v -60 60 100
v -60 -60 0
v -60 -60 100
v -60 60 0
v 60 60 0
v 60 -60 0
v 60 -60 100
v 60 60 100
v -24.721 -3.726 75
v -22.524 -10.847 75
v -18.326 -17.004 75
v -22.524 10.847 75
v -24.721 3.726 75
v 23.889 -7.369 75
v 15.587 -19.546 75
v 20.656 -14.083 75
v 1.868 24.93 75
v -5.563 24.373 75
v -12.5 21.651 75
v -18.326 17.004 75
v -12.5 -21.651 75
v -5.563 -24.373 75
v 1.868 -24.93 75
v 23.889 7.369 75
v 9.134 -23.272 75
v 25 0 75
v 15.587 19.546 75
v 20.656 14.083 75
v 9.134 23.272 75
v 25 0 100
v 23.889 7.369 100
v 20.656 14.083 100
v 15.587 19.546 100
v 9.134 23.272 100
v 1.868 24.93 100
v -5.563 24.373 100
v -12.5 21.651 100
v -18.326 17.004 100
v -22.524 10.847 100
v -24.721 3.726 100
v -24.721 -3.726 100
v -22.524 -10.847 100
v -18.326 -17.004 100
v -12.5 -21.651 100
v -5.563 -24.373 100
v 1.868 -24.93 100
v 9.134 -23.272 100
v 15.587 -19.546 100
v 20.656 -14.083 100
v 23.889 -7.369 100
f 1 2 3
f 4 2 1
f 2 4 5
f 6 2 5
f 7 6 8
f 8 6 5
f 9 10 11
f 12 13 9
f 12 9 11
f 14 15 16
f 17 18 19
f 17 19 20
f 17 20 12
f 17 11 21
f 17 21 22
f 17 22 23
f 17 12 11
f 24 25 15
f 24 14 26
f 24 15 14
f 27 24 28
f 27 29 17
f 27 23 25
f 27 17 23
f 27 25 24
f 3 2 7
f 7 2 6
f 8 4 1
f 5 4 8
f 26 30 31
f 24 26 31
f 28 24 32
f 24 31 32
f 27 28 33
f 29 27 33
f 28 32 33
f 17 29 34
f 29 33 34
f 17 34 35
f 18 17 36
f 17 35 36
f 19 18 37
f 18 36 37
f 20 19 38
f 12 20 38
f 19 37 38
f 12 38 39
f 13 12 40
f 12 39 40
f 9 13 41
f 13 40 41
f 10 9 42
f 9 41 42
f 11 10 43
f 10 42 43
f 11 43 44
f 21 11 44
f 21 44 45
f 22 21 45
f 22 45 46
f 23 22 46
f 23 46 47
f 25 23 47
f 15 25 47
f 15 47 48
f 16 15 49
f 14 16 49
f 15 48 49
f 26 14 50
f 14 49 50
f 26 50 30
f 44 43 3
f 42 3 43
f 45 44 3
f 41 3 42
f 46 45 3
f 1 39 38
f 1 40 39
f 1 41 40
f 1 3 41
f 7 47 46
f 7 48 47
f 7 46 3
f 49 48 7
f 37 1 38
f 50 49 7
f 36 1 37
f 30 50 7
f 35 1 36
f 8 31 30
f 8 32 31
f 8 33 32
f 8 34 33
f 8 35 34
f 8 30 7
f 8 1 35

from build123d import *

# Parameters (mm, degrees)
F0_W     = 120
F0_H     = 120
F1_DEPTH = 100
F2_R     = 25
F3_DEPTH = 25


with BuildPart() as f1:
    # F0 (on Top) → F1 (new body)
    with BuildSketch(Plane.XY):
        Rectangle(F0_W, F0_H)
    extrude(amount=F1_DEPTH)


with BuildPart() as f3:
    # F2 (on face) → F3 (new body)
    with BuildSketch(Plane.XY.offset(100)):
        Circle(F2_R)
    extrude(amount=-F3_DEPTH)


with BuildPart() as f1_1:
    add(f1.part)

    # F4: cut F3
    add(f3.part, mode=Mode.SUBTRACT)


solid = f1_1.part
